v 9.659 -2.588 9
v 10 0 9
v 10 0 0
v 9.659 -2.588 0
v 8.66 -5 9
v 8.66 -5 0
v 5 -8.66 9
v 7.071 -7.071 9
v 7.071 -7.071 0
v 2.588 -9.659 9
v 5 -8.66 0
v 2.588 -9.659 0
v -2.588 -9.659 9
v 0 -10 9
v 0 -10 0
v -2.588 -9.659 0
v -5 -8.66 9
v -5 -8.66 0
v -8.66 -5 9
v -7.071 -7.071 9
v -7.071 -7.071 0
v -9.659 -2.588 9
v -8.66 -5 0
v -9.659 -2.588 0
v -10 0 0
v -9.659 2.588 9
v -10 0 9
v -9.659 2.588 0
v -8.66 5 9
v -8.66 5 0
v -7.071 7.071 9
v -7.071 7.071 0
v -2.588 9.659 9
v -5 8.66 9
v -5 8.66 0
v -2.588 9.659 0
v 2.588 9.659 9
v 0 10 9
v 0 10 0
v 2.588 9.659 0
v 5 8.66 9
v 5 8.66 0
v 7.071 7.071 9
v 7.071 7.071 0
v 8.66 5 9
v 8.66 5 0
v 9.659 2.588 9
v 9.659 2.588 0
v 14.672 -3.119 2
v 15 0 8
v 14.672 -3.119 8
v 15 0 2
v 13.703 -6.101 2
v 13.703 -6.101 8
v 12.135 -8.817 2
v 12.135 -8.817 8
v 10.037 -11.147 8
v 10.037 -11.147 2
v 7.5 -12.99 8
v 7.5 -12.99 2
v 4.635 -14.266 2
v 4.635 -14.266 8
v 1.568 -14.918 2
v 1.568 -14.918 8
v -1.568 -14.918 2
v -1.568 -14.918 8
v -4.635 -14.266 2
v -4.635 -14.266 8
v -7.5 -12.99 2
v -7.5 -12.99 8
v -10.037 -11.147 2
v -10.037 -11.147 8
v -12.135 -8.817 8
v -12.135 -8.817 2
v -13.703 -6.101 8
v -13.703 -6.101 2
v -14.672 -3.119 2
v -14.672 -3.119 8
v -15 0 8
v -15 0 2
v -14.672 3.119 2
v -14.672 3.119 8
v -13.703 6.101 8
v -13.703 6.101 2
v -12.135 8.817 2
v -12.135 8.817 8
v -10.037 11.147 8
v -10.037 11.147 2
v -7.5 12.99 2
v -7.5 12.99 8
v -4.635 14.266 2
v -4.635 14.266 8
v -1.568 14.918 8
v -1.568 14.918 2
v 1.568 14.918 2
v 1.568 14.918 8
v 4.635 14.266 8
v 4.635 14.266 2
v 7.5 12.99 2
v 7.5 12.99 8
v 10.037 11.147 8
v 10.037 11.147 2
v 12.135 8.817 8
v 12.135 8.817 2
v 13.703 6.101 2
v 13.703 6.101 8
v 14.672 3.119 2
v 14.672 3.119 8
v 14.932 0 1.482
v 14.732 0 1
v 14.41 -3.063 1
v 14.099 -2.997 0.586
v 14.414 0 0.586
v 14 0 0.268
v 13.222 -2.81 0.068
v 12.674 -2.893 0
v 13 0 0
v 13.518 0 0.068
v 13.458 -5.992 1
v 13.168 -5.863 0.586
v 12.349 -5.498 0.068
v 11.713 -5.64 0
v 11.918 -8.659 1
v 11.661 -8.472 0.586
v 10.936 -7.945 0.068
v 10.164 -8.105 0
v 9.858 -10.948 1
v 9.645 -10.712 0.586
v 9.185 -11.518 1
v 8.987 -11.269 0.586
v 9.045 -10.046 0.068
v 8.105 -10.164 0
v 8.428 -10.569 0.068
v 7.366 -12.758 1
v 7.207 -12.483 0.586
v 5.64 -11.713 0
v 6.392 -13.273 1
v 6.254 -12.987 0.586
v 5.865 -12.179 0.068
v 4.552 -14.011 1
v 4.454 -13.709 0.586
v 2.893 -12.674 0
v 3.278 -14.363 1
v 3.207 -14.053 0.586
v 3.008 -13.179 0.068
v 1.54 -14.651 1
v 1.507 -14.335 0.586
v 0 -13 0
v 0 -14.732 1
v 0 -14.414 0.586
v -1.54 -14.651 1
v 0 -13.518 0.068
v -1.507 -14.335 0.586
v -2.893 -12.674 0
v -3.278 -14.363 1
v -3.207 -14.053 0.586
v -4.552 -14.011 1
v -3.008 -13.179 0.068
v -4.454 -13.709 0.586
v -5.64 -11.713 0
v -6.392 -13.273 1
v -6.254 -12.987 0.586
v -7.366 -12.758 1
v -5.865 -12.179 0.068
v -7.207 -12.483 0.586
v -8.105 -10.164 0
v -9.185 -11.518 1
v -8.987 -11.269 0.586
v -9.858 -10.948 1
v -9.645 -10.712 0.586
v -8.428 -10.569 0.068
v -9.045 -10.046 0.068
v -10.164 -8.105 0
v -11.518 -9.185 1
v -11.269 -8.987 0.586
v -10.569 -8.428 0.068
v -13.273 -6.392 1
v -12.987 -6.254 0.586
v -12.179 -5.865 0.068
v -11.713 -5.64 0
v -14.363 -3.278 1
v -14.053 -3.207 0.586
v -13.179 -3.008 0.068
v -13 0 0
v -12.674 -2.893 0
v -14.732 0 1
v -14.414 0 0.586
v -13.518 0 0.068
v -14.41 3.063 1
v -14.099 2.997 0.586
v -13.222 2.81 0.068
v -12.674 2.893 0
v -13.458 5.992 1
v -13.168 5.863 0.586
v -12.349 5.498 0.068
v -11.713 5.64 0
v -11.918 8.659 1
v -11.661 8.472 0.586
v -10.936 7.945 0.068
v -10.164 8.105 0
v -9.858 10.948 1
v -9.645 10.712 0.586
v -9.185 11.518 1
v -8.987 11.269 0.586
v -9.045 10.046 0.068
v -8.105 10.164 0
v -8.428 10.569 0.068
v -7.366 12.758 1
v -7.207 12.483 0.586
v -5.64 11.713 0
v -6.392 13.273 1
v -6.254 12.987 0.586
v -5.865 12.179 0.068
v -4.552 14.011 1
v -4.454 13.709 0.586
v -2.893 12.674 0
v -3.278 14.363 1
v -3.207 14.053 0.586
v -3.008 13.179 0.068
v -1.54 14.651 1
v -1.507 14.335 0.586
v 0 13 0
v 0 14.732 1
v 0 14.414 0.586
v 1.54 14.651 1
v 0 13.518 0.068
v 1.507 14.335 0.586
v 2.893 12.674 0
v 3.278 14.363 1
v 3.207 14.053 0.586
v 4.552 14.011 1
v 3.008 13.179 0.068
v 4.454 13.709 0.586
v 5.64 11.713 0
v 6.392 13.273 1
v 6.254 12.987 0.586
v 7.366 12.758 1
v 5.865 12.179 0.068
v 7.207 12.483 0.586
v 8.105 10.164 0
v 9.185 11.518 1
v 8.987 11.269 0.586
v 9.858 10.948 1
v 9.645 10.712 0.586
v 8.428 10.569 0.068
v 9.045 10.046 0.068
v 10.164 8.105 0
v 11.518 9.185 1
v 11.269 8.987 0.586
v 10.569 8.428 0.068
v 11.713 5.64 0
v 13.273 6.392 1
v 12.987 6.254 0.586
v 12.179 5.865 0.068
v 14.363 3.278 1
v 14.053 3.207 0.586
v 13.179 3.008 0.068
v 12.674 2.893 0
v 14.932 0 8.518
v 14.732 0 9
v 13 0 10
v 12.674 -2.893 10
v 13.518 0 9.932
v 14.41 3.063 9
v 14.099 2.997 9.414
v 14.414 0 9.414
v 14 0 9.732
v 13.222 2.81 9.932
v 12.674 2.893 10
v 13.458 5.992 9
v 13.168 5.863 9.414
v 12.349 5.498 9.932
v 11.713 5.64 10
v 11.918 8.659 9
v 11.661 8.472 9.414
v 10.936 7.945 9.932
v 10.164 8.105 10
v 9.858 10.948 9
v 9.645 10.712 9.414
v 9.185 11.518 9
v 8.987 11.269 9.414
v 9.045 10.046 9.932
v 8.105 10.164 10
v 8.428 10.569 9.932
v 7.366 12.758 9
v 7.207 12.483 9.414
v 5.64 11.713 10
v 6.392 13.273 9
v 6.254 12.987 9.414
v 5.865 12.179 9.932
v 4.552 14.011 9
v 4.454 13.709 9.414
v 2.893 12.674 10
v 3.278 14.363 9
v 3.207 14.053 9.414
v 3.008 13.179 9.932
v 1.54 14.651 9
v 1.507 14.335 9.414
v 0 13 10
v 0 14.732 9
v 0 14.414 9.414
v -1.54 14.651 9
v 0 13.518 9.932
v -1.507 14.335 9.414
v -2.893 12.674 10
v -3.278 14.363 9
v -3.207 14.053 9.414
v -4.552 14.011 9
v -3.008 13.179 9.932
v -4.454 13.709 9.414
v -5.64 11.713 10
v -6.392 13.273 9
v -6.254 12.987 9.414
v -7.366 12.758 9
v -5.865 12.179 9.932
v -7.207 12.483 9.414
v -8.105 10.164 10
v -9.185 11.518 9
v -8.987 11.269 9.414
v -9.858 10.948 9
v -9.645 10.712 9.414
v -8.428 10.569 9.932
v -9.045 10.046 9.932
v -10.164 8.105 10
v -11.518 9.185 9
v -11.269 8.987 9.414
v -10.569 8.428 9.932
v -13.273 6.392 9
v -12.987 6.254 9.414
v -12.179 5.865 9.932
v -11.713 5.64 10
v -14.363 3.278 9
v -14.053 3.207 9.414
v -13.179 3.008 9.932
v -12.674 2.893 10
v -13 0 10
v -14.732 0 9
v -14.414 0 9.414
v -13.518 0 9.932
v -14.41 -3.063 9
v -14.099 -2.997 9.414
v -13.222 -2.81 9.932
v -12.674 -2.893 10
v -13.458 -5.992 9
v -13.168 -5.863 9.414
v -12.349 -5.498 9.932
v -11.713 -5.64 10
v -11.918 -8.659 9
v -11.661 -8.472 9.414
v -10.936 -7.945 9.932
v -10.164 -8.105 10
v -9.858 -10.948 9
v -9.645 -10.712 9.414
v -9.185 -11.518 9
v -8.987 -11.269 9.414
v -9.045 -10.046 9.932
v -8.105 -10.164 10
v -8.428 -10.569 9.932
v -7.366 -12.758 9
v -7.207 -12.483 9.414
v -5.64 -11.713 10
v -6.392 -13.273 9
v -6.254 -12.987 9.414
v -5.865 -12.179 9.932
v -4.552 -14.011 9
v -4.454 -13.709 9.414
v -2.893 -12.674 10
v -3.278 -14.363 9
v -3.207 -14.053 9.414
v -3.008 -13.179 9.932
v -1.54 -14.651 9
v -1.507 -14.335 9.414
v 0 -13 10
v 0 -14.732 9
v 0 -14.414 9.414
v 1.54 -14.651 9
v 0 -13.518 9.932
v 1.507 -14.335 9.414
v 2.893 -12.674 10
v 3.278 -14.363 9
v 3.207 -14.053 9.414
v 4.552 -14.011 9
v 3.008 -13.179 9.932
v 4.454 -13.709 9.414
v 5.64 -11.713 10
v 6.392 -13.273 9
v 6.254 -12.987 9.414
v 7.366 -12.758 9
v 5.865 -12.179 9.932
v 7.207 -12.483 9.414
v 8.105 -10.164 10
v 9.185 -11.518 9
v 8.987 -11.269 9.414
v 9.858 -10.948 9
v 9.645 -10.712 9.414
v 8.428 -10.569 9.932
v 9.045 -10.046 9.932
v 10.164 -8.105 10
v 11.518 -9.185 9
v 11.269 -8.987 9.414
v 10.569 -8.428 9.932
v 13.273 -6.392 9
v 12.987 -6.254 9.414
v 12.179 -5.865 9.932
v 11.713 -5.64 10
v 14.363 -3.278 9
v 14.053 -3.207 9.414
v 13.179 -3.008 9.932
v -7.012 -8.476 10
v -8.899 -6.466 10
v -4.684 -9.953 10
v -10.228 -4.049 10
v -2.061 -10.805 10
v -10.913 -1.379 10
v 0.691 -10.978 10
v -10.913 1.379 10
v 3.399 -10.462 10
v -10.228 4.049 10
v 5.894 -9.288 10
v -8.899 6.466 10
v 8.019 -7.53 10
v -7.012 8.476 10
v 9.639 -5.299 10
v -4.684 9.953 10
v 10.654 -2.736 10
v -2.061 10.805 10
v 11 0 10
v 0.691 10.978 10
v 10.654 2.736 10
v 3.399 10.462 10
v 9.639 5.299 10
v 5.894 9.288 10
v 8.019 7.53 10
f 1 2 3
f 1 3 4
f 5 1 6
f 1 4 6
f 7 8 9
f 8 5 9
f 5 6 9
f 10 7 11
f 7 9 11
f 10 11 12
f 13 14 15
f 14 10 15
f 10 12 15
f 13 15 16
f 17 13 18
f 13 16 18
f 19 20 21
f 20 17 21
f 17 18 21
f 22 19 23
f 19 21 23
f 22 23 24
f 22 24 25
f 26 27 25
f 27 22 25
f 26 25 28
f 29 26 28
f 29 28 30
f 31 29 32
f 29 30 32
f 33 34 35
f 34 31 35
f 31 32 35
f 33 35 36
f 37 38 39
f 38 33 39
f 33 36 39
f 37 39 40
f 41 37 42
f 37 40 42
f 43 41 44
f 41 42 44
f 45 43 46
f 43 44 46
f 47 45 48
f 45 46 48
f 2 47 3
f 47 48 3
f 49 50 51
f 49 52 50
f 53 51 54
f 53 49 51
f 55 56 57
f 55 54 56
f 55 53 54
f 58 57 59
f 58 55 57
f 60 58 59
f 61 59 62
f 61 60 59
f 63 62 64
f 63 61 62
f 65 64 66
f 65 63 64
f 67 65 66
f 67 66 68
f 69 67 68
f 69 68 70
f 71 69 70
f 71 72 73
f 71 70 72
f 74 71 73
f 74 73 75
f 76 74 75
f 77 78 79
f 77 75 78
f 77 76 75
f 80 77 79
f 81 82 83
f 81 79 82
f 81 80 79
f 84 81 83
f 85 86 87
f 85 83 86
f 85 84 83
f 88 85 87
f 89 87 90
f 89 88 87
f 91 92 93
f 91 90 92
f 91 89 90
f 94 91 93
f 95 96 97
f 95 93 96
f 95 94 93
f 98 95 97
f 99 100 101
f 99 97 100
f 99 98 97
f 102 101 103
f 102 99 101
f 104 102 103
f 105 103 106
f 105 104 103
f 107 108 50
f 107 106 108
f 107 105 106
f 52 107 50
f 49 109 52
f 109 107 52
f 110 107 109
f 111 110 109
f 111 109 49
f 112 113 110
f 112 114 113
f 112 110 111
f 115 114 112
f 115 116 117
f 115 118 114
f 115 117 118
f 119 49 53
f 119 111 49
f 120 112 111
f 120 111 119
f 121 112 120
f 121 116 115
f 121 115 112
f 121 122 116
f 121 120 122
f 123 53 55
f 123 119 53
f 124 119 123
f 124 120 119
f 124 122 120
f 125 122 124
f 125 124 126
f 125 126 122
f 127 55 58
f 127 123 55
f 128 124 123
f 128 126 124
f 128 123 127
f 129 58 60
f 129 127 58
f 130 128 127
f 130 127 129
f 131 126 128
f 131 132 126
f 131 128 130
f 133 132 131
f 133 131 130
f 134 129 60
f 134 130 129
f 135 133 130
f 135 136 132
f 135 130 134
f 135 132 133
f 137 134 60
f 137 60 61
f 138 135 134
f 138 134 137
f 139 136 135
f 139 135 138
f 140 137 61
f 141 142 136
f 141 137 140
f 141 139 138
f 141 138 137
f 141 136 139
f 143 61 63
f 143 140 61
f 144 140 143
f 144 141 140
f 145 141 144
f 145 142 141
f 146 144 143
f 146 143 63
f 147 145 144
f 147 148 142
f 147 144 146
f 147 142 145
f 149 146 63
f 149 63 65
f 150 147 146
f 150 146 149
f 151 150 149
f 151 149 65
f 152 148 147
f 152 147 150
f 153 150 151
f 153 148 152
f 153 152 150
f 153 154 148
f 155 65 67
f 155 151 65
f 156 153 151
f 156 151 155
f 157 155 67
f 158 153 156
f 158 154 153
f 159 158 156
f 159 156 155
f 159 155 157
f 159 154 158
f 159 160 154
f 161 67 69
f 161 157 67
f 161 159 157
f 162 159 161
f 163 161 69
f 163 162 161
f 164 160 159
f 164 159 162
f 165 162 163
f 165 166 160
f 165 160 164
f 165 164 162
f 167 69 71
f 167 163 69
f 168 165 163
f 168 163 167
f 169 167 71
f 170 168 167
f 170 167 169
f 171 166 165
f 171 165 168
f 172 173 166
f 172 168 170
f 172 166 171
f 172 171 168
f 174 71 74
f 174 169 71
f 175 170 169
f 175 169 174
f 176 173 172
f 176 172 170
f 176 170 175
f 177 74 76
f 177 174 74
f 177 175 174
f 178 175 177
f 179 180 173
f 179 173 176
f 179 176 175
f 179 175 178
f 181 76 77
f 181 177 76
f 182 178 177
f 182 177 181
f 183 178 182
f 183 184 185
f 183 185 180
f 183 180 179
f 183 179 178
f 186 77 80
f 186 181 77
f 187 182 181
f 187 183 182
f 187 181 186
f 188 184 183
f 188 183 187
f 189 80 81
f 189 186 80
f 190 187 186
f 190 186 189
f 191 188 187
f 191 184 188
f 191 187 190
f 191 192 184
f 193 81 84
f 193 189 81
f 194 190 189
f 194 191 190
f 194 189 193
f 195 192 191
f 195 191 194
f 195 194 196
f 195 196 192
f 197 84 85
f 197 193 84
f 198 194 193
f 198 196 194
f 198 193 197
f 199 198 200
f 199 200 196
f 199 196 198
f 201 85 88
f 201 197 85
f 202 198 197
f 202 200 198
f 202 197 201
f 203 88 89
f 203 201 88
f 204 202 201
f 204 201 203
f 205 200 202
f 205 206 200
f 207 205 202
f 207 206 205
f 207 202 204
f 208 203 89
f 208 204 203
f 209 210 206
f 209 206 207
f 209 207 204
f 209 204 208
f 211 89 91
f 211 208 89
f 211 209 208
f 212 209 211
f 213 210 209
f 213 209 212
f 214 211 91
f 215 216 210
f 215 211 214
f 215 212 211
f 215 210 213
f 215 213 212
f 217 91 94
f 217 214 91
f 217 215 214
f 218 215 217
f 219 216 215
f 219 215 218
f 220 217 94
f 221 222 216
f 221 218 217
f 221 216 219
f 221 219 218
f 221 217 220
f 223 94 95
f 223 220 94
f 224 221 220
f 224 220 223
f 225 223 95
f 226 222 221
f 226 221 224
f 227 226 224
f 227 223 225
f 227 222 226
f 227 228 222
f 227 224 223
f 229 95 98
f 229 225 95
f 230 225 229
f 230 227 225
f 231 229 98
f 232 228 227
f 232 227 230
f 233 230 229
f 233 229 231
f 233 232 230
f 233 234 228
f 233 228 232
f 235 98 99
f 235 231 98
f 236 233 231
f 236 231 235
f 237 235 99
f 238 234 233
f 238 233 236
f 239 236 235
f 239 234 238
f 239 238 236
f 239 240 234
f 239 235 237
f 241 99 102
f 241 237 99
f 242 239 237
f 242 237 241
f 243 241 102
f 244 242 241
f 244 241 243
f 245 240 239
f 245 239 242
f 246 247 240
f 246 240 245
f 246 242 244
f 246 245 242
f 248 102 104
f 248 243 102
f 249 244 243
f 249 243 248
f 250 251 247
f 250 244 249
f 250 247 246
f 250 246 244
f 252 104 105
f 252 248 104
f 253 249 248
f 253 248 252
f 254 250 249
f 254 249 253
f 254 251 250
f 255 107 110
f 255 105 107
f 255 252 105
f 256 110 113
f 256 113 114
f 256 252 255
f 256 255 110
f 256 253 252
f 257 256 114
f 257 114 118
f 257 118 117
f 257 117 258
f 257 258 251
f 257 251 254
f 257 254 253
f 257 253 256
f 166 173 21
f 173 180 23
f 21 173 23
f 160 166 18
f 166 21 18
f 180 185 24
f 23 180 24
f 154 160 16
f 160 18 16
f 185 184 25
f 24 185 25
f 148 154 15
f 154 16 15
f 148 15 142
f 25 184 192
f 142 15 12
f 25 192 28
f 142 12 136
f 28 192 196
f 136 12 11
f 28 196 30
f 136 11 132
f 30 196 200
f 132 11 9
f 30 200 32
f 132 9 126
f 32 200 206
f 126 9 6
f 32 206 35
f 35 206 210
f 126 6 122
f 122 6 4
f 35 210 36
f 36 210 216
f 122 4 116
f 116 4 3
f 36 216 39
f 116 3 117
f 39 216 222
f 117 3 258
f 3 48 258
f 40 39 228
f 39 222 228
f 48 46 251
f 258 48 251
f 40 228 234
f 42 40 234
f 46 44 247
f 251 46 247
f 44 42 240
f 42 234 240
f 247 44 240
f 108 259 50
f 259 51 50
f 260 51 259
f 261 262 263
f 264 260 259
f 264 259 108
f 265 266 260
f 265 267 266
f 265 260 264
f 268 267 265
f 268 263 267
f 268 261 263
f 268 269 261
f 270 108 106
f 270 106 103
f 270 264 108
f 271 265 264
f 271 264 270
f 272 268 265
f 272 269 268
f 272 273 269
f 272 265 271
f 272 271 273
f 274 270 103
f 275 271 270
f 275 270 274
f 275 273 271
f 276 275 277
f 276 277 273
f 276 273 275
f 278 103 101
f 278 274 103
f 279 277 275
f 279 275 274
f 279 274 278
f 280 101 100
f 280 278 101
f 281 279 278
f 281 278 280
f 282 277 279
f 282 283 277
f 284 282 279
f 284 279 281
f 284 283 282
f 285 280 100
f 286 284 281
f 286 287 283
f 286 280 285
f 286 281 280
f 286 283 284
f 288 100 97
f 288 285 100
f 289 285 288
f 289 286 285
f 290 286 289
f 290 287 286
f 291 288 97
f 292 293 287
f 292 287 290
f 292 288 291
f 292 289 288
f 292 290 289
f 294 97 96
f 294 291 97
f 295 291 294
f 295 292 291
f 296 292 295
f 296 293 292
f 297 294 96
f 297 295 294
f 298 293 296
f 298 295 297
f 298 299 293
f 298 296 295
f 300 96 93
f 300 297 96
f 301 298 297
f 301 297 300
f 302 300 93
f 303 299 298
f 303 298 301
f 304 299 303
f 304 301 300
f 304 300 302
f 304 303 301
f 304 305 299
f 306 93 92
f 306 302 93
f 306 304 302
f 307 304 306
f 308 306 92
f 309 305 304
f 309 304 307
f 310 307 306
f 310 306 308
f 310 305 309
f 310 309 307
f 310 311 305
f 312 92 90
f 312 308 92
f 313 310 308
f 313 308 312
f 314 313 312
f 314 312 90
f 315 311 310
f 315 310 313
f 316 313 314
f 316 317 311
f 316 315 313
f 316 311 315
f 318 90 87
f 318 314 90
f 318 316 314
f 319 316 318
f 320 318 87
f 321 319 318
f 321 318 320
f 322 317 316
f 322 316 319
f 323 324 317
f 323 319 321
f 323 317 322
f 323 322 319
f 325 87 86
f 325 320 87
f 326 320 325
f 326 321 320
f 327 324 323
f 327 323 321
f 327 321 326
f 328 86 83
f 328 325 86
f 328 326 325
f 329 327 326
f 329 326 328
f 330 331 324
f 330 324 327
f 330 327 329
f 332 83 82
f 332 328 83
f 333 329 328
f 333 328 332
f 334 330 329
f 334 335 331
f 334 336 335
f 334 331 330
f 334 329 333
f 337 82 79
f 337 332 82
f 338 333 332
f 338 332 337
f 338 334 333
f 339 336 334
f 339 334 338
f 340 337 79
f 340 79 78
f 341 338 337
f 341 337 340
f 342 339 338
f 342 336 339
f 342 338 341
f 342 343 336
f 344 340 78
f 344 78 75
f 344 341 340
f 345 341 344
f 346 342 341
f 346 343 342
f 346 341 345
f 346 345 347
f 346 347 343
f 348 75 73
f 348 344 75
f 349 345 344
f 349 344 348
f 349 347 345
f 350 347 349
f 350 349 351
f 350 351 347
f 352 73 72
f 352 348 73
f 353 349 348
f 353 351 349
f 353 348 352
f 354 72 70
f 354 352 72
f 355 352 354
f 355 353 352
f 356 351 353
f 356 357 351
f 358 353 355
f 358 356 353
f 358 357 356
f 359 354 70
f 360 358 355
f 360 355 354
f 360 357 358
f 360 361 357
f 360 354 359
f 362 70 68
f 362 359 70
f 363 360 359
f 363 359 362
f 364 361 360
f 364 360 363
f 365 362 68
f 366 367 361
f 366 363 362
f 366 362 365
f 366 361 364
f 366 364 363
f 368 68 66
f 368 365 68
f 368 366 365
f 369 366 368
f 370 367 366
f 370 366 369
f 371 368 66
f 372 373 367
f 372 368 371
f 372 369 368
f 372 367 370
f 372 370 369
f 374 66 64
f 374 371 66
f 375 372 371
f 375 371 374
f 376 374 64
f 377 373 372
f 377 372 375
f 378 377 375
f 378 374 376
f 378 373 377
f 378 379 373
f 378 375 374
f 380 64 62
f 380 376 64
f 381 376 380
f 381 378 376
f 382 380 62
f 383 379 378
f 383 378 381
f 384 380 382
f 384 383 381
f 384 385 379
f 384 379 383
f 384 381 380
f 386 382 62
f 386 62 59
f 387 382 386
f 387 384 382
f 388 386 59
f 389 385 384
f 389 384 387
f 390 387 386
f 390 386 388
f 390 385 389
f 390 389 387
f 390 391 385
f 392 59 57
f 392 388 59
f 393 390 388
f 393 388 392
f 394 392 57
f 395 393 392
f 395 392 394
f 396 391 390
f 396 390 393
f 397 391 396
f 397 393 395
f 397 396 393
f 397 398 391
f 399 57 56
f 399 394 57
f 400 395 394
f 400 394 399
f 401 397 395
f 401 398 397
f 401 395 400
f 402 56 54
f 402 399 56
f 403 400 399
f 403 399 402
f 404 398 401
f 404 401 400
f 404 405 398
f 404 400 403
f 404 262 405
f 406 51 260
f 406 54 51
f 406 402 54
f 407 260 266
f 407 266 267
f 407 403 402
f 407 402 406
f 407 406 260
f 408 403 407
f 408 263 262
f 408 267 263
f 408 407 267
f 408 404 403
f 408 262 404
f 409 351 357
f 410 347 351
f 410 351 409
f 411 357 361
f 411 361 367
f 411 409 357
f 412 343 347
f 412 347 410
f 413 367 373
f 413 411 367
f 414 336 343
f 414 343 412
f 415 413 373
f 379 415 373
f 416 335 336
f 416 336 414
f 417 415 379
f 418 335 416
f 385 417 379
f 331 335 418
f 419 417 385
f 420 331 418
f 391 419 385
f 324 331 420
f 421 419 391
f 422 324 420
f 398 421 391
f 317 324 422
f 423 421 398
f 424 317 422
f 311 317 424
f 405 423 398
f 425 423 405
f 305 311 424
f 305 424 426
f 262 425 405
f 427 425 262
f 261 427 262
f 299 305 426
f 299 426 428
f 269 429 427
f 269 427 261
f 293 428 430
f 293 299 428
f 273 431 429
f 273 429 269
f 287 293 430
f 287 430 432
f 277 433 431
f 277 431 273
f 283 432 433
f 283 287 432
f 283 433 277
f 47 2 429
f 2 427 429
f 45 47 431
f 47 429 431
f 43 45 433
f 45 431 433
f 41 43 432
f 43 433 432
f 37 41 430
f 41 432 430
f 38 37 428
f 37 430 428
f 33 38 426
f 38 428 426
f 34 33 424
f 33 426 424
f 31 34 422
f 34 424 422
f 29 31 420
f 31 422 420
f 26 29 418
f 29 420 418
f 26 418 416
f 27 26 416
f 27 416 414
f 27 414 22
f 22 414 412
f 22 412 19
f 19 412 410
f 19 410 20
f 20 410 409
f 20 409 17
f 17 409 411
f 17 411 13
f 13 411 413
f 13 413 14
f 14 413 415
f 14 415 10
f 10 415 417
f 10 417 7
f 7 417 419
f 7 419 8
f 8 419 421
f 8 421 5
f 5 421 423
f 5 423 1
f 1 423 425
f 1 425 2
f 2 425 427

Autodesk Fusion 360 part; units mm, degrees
sketch "Esquisse1" plane through (0, 0, 0) normal (0, 0, 1) x (1, 0, 0)
  circle A0 centre (0, 0) radius 10
  circle A1 centre (0, 0) radius 15
  dimension "d1" = 20
  dimension "d2" = 30
extrude "Extrusion1" add sketch "Esquisse1" along normal blind 10
fillet "Congé1" radius 2 2 edges at (-13.9849, -5.4242, 10) (-13.9849, -5.4242, 0)
chamfer "Chanfrein1" distance 1 angle 45 1 edges at (-9.3233, 3.6162, 10)
